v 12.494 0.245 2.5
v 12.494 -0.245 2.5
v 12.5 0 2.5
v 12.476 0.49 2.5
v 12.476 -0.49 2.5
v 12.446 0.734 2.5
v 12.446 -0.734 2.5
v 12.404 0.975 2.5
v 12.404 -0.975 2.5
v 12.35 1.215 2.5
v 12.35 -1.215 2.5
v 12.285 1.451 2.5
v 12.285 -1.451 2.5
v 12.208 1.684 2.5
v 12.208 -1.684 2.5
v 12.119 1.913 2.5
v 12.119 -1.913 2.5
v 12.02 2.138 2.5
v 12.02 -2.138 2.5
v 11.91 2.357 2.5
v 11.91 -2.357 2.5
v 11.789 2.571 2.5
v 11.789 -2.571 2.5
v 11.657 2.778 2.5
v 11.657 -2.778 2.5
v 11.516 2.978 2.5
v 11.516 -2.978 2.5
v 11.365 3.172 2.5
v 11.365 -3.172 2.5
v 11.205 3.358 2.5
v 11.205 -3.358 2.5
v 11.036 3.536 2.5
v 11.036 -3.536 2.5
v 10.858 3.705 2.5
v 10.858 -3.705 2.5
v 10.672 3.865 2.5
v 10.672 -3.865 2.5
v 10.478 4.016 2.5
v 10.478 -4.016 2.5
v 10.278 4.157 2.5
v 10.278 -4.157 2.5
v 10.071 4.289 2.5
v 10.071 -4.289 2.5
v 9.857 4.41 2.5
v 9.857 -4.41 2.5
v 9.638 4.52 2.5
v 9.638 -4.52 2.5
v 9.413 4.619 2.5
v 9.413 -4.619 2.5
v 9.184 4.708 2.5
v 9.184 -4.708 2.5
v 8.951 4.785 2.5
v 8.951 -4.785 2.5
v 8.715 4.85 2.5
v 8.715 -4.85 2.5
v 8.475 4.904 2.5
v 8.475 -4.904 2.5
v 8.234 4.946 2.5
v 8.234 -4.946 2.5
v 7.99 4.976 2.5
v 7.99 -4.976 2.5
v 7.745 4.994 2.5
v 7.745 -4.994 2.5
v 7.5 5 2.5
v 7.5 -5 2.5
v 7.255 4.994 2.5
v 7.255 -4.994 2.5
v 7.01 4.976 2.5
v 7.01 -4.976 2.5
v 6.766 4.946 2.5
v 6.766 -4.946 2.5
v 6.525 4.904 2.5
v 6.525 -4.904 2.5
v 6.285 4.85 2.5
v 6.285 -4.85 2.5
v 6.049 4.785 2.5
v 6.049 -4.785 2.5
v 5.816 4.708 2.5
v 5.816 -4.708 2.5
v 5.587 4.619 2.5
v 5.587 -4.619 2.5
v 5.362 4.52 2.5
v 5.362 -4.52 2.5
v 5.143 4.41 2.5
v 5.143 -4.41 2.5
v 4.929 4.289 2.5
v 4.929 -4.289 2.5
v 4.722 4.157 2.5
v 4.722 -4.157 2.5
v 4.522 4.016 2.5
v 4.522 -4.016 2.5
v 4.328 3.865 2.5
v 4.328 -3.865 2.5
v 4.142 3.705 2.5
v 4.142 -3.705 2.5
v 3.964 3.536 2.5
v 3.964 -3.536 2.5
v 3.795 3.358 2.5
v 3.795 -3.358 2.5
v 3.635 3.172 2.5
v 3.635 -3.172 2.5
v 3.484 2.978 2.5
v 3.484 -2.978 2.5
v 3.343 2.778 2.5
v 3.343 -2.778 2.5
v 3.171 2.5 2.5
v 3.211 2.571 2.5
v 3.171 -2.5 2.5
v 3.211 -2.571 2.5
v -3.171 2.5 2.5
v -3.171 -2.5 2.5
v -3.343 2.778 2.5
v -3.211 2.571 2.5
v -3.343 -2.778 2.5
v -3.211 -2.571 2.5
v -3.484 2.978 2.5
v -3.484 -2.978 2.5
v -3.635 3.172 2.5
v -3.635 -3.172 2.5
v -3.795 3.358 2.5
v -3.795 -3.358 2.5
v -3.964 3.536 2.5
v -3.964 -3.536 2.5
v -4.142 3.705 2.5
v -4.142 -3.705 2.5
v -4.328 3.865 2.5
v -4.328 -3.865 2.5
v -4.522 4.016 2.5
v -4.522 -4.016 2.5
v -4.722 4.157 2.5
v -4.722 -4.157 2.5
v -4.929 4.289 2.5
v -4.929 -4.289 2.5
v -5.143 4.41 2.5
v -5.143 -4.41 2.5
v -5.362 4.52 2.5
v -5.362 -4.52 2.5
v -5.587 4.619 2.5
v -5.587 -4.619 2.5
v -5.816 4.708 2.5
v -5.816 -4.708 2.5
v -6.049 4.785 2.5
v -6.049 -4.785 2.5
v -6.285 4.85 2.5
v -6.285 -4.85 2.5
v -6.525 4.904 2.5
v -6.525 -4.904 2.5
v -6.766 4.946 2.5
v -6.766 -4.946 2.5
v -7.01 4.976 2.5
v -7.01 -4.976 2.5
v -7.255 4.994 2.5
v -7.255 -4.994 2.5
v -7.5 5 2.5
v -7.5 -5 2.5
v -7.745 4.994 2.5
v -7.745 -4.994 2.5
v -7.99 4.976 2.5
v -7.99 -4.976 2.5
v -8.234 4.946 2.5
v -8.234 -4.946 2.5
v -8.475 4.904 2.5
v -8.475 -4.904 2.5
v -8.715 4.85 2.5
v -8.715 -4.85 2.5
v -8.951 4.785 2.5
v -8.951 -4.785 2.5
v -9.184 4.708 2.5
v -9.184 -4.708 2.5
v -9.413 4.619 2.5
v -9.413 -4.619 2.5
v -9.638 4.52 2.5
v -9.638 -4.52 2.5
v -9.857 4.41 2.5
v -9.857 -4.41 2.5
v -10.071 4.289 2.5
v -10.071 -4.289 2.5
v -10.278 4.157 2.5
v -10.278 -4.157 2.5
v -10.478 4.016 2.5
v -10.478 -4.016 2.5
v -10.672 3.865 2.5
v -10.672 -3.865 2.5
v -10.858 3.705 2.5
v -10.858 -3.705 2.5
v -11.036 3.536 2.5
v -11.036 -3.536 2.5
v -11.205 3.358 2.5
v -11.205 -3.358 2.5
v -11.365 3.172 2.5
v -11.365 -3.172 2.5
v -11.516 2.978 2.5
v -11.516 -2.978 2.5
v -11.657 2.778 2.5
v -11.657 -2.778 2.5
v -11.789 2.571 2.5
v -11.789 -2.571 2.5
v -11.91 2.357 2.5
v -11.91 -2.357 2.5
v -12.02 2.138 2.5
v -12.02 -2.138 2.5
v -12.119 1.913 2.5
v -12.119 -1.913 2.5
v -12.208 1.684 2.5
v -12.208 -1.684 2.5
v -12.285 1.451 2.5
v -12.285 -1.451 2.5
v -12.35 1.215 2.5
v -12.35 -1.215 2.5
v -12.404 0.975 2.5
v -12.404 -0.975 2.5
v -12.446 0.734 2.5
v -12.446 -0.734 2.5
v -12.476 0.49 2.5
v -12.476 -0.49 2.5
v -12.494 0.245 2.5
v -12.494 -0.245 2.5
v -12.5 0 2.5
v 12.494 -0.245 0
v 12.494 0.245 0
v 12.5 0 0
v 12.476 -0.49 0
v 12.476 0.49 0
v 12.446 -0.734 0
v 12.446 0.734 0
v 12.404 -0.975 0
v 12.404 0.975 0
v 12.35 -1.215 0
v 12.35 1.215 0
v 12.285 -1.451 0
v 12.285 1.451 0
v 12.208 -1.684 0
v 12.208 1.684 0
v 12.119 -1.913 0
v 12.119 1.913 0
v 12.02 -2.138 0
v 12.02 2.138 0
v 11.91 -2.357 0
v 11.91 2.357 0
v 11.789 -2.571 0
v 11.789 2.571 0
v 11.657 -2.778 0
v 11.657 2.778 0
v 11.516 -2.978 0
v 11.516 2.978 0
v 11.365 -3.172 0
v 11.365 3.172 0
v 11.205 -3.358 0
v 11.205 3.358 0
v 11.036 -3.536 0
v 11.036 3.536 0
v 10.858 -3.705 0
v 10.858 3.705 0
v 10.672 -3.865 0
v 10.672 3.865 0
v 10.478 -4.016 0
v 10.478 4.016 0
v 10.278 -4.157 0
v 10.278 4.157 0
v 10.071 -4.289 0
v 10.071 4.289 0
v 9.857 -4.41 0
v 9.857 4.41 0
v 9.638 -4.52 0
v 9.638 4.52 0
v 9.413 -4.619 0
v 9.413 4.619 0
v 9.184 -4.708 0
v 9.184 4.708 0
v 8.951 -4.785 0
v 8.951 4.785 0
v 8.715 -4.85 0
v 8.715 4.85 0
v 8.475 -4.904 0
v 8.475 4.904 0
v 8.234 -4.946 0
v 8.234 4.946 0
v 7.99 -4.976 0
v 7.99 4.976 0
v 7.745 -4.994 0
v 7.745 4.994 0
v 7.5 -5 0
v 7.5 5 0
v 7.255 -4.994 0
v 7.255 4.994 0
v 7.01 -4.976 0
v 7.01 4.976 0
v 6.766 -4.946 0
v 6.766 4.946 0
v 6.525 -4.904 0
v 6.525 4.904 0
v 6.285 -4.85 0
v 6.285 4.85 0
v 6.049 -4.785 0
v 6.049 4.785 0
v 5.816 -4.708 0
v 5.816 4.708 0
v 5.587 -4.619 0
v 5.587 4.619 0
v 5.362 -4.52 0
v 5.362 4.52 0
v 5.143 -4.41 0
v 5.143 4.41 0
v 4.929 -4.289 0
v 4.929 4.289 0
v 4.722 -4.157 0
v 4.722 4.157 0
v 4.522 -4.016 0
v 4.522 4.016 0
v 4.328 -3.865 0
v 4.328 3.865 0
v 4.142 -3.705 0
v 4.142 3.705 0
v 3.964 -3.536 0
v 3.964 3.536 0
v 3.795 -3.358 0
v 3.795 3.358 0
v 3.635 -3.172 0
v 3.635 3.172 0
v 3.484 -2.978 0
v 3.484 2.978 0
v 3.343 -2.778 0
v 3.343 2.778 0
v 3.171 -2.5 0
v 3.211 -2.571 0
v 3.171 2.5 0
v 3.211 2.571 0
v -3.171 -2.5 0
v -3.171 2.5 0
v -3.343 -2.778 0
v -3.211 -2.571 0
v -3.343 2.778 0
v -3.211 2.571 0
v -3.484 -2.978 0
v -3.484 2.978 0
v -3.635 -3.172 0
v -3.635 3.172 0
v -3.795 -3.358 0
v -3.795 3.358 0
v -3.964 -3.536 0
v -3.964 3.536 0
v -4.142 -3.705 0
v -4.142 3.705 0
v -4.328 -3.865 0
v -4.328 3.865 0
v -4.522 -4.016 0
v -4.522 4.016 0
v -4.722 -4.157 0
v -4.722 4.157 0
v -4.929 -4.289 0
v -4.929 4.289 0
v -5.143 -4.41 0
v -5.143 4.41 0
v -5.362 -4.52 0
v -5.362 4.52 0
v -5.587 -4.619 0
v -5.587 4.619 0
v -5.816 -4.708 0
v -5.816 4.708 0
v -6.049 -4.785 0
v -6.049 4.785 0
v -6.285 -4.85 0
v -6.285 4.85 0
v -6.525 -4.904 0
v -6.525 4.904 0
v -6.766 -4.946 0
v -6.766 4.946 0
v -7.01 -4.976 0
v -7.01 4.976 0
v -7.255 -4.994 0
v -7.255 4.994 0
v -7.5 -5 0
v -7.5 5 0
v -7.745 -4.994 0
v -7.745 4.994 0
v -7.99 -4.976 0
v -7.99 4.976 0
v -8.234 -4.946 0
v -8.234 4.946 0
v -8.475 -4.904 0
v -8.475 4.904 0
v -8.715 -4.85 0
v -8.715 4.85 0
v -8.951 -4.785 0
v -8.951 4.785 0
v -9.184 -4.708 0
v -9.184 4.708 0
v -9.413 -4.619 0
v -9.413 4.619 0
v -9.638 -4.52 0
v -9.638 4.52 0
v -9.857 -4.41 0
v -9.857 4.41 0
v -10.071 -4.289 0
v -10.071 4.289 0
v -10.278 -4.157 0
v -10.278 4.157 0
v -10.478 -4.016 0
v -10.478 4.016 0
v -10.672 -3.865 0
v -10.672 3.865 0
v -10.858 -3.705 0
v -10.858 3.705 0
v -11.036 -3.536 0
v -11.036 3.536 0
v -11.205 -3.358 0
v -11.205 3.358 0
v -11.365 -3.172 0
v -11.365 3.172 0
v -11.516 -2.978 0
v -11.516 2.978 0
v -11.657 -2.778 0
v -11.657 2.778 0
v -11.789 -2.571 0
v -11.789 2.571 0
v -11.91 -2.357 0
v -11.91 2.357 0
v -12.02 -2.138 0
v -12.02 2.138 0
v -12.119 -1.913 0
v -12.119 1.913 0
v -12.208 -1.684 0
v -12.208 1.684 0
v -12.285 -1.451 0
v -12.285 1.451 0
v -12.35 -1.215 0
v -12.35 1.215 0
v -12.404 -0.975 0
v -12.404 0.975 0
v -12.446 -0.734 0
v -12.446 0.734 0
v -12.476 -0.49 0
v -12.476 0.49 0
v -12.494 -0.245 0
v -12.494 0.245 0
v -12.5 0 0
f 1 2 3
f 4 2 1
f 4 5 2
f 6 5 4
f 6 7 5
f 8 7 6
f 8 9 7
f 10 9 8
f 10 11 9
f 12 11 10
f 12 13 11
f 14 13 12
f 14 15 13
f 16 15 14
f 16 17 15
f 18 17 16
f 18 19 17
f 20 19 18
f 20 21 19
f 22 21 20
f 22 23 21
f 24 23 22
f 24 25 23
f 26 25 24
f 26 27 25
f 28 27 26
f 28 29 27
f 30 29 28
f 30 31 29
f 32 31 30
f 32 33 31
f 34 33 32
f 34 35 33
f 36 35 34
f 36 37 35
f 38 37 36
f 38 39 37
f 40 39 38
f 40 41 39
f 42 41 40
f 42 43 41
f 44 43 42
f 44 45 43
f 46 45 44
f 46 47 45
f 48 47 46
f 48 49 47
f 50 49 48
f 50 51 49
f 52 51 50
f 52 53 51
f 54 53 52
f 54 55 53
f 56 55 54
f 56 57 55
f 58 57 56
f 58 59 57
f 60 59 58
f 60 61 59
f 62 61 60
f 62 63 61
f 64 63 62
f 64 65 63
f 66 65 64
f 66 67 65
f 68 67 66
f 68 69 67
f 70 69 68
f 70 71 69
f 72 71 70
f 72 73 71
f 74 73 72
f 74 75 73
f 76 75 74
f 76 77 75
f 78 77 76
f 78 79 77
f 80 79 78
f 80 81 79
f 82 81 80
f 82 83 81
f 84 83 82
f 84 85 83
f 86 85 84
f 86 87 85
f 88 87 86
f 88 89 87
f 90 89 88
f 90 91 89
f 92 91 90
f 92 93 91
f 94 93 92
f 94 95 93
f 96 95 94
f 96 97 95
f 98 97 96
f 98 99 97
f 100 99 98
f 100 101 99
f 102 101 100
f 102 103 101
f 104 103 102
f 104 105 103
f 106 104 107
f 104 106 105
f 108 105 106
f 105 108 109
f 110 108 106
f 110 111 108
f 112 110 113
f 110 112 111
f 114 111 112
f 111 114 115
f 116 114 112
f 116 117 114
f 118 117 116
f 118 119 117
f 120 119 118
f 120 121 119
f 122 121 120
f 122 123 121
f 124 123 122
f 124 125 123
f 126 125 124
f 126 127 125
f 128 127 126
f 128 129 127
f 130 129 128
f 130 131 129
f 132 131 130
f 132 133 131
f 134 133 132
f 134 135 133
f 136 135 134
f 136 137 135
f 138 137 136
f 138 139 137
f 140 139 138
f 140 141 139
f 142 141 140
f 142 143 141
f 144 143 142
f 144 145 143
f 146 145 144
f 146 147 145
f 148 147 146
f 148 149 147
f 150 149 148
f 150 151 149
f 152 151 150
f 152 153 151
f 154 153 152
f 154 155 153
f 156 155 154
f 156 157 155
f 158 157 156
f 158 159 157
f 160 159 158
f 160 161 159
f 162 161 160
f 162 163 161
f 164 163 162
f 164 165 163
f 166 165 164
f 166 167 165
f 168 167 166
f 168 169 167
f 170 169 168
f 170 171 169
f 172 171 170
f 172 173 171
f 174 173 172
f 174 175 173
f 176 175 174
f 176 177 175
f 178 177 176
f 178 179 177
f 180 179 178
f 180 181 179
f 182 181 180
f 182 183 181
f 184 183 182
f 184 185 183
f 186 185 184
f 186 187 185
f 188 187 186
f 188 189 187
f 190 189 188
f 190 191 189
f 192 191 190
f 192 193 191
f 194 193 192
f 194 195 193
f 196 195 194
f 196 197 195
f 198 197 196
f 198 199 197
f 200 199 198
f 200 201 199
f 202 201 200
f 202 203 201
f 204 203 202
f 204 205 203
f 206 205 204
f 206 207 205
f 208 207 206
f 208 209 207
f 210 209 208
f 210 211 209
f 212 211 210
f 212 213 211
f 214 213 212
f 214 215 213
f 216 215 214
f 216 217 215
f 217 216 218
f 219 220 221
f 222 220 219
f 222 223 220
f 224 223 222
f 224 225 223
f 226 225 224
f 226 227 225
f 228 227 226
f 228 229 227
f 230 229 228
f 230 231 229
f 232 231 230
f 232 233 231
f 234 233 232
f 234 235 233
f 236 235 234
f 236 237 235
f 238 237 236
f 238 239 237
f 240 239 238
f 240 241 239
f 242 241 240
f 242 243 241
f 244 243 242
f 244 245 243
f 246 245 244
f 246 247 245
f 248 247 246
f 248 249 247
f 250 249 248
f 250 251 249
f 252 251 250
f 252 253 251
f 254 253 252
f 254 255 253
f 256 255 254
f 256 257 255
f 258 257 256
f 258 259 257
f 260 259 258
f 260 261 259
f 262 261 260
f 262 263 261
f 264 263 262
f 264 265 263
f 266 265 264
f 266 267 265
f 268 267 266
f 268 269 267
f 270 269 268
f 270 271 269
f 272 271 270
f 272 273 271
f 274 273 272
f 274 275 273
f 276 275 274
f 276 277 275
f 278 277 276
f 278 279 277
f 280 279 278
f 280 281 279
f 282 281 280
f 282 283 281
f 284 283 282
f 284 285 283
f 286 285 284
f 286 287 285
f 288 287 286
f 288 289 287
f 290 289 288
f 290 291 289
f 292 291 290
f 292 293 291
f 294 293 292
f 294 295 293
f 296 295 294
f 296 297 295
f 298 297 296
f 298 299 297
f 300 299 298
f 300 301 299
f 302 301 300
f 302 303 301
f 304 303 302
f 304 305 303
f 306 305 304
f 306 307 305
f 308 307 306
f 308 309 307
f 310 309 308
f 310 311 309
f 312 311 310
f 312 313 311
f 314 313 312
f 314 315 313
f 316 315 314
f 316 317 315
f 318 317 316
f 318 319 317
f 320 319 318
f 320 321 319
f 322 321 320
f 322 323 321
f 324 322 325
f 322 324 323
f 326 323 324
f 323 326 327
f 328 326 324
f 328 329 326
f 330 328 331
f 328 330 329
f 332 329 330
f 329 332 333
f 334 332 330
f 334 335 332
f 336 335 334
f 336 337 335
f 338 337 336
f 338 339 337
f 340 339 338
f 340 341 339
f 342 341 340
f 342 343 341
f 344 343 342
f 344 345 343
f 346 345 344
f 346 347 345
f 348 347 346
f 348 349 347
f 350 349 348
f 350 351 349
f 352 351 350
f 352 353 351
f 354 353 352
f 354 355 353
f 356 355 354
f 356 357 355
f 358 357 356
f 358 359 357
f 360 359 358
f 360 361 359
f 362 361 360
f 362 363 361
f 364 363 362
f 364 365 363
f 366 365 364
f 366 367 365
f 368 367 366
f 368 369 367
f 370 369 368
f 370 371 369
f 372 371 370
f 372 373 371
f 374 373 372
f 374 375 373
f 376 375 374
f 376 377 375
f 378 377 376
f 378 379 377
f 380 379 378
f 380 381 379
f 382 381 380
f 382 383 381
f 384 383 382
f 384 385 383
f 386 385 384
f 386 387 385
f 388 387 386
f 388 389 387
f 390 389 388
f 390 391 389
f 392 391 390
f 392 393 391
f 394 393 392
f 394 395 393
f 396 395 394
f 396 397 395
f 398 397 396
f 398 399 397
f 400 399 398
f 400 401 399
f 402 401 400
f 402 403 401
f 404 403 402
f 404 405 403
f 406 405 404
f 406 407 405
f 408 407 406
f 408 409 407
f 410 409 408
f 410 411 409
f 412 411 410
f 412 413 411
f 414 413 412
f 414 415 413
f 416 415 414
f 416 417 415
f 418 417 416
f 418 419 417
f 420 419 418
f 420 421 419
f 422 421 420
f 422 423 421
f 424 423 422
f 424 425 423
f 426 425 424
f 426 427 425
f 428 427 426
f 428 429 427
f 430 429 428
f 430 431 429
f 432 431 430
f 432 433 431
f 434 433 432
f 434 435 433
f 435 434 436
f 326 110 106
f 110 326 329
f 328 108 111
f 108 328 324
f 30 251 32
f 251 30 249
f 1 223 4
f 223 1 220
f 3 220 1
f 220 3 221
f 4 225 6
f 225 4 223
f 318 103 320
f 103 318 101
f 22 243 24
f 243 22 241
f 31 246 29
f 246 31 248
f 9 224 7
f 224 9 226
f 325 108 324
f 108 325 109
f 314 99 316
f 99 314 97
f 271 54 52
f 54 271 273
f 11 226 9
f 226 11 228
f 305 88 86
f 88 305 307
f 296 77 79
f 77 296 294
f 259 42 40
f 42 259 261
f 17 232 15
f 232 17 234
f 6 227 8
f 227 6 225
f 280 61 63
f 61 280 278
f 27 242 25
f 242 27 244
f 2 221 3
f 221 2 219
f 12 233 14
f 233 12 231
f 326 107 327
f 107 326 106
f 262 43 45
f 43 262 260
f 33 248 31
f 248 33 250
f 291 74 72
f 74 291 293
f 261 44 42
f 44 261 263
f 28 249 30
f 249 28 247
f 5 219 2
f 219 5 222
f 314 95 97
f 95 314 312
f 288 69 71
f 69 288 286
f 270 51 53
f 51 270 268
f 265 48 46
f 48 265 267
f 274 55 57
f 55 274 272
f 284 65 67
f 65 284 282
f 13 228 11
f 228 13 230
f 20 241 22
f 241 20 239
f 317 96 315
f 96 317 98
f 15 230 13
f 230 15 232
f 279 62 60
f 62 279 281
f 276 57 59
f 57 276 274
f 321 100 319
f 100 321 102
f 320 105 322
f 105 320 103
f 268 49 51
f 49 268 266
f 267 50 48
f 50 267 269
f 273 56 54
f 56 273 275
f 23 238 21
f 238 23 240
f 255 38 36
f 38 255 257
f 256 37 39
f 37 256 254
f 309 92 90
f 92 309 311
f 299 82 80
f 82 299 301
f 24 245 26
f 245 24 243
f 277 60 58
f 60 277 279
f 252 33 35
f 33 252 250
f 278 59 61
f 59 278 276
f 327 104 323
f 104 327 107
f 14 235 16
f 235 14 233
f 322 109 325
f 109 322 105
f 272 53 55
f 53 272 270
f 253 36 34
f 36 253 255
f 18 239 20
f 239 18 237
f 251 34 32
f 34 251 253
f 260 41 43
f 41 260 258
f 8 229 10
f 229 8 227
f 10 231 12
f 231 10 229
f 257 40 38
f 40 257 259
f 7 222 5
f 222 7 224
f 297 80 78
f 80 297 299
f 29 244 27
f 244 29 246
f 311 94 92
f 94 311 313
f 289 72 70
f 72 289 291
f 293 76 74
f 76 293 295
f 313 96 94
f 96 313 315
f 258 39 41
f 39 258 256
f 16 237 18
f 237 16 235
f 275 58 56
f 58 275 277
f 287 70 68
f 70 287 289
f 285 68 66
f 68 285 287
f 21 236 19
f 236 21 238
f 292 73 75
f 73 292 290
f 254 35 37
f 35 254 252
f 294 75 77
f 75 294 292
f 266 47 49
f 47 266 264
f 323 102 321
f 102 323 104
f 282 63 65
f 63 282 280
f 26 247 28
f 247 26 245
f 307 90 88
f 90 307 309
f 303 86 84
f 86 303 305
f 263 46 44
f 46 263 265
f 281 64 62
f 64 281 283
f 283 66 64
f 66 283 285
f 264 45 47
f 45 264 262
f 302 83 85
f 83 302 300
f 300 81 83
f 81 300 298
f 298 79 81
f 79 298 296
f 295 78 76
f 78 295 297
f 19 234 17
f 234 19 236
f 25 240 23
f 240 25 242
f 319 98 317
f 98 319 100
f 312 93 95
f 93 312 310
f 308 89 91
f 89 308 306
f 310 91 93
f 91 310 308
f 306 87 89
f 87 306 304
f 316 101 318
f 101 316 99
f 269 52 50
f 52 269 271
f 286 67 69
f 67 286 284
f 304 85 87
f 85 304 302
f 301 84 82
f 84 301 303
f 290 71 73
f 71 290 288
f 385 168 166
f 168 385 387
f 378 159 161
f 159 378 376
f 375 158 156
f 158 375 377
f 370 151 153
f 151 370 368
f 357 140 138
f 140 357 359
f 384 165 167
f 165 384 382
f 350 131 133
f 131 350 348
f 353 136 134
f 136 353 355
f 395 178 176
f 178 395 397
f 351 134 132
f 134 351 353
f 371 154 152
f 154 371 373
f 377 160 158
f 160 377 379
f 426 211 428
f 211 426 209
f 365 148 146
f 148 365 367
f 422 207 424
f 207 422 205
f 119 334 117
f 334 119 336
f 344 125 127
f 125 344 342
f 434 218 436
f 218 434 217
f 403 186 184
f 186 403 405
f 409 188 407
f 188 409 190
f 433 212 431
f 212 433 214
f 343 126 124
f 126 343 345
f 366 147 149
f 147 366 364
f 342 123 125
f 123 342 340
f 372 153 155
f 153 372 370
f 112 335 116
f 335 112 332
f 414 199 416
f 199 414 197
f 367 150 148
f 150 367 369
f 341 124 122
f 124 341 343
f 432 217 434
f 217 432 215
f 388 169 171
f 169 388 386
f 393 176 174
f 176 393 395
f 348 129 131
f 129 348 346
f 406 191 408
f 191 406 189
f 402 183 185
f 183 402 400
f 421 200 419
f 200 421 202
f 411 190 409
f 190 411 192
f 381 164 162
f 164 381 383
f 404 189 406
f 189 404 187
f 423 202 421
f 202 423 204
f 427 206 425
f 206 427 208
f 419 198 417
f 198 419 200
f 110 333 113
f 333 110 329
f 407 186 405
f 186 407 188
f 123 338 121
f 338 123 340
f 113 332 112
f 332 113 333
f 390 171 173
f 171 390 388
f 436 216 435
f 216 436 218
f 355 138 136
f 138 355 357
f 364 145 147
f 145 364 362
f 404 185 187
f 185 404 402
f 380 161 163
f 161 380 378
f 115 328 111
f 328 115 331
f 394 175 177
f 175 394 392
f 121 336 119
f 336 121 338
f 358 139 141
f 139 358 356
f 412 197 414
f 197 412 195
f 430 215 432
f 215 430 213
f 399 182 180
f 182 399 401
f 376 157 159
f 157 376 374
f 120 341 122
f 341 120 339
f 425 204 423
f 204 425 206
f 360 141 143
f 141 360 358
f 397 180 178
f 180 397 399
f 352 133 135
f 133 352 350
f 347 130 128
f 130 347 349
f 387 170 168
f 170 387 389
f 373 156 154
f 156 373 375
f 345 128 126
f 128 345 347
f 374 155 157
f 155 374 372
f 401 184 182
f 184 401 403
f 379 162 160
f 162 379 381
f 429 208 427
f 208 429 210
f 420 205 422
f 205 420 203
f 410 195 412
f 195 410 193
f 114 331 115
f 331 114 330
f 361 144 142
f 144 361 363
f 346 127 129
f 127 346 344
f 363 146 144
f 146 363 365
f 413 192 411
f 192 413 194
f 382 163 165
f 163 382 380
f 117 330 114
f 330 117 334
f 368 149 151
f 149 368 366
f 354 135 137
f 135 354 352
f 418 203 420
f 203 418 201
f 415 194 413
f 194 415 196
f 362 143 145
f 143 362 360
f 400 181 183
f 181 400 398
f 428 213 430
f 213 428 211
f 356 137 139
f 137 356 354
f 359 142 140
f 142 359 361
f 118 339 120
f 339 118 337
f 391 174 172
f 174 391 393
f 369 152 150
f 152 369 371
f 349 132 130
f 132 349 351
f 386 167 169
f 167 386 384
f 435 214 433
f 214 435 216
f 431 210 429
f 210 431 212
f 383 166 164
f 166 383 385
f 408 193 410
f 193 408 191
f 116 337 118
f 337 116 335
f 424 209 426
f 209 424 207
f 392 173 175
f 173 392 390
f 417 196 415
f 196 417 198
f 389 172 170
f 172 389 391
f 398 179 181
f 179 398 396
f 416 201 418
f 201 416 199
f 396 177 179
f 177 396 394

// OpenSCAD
$fn=128;

xsquares = 3;
ysquares = 8;
square_size = 20;
first_layer_height = .2;
board_height = 5;
connecter_height = 2.5;

thing = "connecter"; // connecter, squares, or back

pxedge=false;
pyedge=false;
nxedge=true;
nyedge=false;

module grid(gridx, gridy, sizex, sizey, height) {
    for (i = [0:gridx-1]) {
        for (j = [0:gridy-1]) {
            if ( (i+j) % 2 == 0) {
                translate([sizex*i,sizey*j,0])cube([sizex,sizey,height]);
            }
        }
    }
}

module connecter() {
    translate([0,0,connecter_height/2])cube([15,5,connecter_height],center=true);
    translate([ 7.5,0,0])cylinder(r=5,h=connecter_height);
    translate([-7.5,0,0])cylinder(r=5,h=connecter_height);
}
if (thing == "back") {
difference() {
    cube([xsquares*square_size,ysquares*square_size,board_height]);
    grid(xsquares,ysquares,square_size,square_size,first_layer_height);
    if (nxedge) {
        translate([0,3/2*square_size,3])
        connecter();
        translate([0,(ysquares-3/2)*square_size,3])
        connecter();
    }
    if (pxedge) {
        translate([xsquares*square_size,3/2*square_size,3])
        connecter();
        translate([xsquares*square_size,(ysquares-3/2)*square_size,3])
        connecter();
    }
    if (nyedge) {
        translate([3/2*square_size,0,3])
        rotate([0,0,90])
        connecter();
        translate([(xsquares-3/2)*square_size,0,3])
        rotate([0,0,90])
        connecter();
    }
    if (pyedge) {
        translate([3/2*square_size,ysquares*square_size,3])
        rotate([0,0,90])
        connecter();
        translate([(xsquares-3/2)*square_size,ysquares*square_size,3])
        rotate([0,0,90])
        connecter();
    }
}
}
if (thing == "squares") {
    union() {
        grid(xsquares,ysquares,square_size,square_size,first_layer_height);
    }
}
if (thing == "connecter") {
    connecter();
}
